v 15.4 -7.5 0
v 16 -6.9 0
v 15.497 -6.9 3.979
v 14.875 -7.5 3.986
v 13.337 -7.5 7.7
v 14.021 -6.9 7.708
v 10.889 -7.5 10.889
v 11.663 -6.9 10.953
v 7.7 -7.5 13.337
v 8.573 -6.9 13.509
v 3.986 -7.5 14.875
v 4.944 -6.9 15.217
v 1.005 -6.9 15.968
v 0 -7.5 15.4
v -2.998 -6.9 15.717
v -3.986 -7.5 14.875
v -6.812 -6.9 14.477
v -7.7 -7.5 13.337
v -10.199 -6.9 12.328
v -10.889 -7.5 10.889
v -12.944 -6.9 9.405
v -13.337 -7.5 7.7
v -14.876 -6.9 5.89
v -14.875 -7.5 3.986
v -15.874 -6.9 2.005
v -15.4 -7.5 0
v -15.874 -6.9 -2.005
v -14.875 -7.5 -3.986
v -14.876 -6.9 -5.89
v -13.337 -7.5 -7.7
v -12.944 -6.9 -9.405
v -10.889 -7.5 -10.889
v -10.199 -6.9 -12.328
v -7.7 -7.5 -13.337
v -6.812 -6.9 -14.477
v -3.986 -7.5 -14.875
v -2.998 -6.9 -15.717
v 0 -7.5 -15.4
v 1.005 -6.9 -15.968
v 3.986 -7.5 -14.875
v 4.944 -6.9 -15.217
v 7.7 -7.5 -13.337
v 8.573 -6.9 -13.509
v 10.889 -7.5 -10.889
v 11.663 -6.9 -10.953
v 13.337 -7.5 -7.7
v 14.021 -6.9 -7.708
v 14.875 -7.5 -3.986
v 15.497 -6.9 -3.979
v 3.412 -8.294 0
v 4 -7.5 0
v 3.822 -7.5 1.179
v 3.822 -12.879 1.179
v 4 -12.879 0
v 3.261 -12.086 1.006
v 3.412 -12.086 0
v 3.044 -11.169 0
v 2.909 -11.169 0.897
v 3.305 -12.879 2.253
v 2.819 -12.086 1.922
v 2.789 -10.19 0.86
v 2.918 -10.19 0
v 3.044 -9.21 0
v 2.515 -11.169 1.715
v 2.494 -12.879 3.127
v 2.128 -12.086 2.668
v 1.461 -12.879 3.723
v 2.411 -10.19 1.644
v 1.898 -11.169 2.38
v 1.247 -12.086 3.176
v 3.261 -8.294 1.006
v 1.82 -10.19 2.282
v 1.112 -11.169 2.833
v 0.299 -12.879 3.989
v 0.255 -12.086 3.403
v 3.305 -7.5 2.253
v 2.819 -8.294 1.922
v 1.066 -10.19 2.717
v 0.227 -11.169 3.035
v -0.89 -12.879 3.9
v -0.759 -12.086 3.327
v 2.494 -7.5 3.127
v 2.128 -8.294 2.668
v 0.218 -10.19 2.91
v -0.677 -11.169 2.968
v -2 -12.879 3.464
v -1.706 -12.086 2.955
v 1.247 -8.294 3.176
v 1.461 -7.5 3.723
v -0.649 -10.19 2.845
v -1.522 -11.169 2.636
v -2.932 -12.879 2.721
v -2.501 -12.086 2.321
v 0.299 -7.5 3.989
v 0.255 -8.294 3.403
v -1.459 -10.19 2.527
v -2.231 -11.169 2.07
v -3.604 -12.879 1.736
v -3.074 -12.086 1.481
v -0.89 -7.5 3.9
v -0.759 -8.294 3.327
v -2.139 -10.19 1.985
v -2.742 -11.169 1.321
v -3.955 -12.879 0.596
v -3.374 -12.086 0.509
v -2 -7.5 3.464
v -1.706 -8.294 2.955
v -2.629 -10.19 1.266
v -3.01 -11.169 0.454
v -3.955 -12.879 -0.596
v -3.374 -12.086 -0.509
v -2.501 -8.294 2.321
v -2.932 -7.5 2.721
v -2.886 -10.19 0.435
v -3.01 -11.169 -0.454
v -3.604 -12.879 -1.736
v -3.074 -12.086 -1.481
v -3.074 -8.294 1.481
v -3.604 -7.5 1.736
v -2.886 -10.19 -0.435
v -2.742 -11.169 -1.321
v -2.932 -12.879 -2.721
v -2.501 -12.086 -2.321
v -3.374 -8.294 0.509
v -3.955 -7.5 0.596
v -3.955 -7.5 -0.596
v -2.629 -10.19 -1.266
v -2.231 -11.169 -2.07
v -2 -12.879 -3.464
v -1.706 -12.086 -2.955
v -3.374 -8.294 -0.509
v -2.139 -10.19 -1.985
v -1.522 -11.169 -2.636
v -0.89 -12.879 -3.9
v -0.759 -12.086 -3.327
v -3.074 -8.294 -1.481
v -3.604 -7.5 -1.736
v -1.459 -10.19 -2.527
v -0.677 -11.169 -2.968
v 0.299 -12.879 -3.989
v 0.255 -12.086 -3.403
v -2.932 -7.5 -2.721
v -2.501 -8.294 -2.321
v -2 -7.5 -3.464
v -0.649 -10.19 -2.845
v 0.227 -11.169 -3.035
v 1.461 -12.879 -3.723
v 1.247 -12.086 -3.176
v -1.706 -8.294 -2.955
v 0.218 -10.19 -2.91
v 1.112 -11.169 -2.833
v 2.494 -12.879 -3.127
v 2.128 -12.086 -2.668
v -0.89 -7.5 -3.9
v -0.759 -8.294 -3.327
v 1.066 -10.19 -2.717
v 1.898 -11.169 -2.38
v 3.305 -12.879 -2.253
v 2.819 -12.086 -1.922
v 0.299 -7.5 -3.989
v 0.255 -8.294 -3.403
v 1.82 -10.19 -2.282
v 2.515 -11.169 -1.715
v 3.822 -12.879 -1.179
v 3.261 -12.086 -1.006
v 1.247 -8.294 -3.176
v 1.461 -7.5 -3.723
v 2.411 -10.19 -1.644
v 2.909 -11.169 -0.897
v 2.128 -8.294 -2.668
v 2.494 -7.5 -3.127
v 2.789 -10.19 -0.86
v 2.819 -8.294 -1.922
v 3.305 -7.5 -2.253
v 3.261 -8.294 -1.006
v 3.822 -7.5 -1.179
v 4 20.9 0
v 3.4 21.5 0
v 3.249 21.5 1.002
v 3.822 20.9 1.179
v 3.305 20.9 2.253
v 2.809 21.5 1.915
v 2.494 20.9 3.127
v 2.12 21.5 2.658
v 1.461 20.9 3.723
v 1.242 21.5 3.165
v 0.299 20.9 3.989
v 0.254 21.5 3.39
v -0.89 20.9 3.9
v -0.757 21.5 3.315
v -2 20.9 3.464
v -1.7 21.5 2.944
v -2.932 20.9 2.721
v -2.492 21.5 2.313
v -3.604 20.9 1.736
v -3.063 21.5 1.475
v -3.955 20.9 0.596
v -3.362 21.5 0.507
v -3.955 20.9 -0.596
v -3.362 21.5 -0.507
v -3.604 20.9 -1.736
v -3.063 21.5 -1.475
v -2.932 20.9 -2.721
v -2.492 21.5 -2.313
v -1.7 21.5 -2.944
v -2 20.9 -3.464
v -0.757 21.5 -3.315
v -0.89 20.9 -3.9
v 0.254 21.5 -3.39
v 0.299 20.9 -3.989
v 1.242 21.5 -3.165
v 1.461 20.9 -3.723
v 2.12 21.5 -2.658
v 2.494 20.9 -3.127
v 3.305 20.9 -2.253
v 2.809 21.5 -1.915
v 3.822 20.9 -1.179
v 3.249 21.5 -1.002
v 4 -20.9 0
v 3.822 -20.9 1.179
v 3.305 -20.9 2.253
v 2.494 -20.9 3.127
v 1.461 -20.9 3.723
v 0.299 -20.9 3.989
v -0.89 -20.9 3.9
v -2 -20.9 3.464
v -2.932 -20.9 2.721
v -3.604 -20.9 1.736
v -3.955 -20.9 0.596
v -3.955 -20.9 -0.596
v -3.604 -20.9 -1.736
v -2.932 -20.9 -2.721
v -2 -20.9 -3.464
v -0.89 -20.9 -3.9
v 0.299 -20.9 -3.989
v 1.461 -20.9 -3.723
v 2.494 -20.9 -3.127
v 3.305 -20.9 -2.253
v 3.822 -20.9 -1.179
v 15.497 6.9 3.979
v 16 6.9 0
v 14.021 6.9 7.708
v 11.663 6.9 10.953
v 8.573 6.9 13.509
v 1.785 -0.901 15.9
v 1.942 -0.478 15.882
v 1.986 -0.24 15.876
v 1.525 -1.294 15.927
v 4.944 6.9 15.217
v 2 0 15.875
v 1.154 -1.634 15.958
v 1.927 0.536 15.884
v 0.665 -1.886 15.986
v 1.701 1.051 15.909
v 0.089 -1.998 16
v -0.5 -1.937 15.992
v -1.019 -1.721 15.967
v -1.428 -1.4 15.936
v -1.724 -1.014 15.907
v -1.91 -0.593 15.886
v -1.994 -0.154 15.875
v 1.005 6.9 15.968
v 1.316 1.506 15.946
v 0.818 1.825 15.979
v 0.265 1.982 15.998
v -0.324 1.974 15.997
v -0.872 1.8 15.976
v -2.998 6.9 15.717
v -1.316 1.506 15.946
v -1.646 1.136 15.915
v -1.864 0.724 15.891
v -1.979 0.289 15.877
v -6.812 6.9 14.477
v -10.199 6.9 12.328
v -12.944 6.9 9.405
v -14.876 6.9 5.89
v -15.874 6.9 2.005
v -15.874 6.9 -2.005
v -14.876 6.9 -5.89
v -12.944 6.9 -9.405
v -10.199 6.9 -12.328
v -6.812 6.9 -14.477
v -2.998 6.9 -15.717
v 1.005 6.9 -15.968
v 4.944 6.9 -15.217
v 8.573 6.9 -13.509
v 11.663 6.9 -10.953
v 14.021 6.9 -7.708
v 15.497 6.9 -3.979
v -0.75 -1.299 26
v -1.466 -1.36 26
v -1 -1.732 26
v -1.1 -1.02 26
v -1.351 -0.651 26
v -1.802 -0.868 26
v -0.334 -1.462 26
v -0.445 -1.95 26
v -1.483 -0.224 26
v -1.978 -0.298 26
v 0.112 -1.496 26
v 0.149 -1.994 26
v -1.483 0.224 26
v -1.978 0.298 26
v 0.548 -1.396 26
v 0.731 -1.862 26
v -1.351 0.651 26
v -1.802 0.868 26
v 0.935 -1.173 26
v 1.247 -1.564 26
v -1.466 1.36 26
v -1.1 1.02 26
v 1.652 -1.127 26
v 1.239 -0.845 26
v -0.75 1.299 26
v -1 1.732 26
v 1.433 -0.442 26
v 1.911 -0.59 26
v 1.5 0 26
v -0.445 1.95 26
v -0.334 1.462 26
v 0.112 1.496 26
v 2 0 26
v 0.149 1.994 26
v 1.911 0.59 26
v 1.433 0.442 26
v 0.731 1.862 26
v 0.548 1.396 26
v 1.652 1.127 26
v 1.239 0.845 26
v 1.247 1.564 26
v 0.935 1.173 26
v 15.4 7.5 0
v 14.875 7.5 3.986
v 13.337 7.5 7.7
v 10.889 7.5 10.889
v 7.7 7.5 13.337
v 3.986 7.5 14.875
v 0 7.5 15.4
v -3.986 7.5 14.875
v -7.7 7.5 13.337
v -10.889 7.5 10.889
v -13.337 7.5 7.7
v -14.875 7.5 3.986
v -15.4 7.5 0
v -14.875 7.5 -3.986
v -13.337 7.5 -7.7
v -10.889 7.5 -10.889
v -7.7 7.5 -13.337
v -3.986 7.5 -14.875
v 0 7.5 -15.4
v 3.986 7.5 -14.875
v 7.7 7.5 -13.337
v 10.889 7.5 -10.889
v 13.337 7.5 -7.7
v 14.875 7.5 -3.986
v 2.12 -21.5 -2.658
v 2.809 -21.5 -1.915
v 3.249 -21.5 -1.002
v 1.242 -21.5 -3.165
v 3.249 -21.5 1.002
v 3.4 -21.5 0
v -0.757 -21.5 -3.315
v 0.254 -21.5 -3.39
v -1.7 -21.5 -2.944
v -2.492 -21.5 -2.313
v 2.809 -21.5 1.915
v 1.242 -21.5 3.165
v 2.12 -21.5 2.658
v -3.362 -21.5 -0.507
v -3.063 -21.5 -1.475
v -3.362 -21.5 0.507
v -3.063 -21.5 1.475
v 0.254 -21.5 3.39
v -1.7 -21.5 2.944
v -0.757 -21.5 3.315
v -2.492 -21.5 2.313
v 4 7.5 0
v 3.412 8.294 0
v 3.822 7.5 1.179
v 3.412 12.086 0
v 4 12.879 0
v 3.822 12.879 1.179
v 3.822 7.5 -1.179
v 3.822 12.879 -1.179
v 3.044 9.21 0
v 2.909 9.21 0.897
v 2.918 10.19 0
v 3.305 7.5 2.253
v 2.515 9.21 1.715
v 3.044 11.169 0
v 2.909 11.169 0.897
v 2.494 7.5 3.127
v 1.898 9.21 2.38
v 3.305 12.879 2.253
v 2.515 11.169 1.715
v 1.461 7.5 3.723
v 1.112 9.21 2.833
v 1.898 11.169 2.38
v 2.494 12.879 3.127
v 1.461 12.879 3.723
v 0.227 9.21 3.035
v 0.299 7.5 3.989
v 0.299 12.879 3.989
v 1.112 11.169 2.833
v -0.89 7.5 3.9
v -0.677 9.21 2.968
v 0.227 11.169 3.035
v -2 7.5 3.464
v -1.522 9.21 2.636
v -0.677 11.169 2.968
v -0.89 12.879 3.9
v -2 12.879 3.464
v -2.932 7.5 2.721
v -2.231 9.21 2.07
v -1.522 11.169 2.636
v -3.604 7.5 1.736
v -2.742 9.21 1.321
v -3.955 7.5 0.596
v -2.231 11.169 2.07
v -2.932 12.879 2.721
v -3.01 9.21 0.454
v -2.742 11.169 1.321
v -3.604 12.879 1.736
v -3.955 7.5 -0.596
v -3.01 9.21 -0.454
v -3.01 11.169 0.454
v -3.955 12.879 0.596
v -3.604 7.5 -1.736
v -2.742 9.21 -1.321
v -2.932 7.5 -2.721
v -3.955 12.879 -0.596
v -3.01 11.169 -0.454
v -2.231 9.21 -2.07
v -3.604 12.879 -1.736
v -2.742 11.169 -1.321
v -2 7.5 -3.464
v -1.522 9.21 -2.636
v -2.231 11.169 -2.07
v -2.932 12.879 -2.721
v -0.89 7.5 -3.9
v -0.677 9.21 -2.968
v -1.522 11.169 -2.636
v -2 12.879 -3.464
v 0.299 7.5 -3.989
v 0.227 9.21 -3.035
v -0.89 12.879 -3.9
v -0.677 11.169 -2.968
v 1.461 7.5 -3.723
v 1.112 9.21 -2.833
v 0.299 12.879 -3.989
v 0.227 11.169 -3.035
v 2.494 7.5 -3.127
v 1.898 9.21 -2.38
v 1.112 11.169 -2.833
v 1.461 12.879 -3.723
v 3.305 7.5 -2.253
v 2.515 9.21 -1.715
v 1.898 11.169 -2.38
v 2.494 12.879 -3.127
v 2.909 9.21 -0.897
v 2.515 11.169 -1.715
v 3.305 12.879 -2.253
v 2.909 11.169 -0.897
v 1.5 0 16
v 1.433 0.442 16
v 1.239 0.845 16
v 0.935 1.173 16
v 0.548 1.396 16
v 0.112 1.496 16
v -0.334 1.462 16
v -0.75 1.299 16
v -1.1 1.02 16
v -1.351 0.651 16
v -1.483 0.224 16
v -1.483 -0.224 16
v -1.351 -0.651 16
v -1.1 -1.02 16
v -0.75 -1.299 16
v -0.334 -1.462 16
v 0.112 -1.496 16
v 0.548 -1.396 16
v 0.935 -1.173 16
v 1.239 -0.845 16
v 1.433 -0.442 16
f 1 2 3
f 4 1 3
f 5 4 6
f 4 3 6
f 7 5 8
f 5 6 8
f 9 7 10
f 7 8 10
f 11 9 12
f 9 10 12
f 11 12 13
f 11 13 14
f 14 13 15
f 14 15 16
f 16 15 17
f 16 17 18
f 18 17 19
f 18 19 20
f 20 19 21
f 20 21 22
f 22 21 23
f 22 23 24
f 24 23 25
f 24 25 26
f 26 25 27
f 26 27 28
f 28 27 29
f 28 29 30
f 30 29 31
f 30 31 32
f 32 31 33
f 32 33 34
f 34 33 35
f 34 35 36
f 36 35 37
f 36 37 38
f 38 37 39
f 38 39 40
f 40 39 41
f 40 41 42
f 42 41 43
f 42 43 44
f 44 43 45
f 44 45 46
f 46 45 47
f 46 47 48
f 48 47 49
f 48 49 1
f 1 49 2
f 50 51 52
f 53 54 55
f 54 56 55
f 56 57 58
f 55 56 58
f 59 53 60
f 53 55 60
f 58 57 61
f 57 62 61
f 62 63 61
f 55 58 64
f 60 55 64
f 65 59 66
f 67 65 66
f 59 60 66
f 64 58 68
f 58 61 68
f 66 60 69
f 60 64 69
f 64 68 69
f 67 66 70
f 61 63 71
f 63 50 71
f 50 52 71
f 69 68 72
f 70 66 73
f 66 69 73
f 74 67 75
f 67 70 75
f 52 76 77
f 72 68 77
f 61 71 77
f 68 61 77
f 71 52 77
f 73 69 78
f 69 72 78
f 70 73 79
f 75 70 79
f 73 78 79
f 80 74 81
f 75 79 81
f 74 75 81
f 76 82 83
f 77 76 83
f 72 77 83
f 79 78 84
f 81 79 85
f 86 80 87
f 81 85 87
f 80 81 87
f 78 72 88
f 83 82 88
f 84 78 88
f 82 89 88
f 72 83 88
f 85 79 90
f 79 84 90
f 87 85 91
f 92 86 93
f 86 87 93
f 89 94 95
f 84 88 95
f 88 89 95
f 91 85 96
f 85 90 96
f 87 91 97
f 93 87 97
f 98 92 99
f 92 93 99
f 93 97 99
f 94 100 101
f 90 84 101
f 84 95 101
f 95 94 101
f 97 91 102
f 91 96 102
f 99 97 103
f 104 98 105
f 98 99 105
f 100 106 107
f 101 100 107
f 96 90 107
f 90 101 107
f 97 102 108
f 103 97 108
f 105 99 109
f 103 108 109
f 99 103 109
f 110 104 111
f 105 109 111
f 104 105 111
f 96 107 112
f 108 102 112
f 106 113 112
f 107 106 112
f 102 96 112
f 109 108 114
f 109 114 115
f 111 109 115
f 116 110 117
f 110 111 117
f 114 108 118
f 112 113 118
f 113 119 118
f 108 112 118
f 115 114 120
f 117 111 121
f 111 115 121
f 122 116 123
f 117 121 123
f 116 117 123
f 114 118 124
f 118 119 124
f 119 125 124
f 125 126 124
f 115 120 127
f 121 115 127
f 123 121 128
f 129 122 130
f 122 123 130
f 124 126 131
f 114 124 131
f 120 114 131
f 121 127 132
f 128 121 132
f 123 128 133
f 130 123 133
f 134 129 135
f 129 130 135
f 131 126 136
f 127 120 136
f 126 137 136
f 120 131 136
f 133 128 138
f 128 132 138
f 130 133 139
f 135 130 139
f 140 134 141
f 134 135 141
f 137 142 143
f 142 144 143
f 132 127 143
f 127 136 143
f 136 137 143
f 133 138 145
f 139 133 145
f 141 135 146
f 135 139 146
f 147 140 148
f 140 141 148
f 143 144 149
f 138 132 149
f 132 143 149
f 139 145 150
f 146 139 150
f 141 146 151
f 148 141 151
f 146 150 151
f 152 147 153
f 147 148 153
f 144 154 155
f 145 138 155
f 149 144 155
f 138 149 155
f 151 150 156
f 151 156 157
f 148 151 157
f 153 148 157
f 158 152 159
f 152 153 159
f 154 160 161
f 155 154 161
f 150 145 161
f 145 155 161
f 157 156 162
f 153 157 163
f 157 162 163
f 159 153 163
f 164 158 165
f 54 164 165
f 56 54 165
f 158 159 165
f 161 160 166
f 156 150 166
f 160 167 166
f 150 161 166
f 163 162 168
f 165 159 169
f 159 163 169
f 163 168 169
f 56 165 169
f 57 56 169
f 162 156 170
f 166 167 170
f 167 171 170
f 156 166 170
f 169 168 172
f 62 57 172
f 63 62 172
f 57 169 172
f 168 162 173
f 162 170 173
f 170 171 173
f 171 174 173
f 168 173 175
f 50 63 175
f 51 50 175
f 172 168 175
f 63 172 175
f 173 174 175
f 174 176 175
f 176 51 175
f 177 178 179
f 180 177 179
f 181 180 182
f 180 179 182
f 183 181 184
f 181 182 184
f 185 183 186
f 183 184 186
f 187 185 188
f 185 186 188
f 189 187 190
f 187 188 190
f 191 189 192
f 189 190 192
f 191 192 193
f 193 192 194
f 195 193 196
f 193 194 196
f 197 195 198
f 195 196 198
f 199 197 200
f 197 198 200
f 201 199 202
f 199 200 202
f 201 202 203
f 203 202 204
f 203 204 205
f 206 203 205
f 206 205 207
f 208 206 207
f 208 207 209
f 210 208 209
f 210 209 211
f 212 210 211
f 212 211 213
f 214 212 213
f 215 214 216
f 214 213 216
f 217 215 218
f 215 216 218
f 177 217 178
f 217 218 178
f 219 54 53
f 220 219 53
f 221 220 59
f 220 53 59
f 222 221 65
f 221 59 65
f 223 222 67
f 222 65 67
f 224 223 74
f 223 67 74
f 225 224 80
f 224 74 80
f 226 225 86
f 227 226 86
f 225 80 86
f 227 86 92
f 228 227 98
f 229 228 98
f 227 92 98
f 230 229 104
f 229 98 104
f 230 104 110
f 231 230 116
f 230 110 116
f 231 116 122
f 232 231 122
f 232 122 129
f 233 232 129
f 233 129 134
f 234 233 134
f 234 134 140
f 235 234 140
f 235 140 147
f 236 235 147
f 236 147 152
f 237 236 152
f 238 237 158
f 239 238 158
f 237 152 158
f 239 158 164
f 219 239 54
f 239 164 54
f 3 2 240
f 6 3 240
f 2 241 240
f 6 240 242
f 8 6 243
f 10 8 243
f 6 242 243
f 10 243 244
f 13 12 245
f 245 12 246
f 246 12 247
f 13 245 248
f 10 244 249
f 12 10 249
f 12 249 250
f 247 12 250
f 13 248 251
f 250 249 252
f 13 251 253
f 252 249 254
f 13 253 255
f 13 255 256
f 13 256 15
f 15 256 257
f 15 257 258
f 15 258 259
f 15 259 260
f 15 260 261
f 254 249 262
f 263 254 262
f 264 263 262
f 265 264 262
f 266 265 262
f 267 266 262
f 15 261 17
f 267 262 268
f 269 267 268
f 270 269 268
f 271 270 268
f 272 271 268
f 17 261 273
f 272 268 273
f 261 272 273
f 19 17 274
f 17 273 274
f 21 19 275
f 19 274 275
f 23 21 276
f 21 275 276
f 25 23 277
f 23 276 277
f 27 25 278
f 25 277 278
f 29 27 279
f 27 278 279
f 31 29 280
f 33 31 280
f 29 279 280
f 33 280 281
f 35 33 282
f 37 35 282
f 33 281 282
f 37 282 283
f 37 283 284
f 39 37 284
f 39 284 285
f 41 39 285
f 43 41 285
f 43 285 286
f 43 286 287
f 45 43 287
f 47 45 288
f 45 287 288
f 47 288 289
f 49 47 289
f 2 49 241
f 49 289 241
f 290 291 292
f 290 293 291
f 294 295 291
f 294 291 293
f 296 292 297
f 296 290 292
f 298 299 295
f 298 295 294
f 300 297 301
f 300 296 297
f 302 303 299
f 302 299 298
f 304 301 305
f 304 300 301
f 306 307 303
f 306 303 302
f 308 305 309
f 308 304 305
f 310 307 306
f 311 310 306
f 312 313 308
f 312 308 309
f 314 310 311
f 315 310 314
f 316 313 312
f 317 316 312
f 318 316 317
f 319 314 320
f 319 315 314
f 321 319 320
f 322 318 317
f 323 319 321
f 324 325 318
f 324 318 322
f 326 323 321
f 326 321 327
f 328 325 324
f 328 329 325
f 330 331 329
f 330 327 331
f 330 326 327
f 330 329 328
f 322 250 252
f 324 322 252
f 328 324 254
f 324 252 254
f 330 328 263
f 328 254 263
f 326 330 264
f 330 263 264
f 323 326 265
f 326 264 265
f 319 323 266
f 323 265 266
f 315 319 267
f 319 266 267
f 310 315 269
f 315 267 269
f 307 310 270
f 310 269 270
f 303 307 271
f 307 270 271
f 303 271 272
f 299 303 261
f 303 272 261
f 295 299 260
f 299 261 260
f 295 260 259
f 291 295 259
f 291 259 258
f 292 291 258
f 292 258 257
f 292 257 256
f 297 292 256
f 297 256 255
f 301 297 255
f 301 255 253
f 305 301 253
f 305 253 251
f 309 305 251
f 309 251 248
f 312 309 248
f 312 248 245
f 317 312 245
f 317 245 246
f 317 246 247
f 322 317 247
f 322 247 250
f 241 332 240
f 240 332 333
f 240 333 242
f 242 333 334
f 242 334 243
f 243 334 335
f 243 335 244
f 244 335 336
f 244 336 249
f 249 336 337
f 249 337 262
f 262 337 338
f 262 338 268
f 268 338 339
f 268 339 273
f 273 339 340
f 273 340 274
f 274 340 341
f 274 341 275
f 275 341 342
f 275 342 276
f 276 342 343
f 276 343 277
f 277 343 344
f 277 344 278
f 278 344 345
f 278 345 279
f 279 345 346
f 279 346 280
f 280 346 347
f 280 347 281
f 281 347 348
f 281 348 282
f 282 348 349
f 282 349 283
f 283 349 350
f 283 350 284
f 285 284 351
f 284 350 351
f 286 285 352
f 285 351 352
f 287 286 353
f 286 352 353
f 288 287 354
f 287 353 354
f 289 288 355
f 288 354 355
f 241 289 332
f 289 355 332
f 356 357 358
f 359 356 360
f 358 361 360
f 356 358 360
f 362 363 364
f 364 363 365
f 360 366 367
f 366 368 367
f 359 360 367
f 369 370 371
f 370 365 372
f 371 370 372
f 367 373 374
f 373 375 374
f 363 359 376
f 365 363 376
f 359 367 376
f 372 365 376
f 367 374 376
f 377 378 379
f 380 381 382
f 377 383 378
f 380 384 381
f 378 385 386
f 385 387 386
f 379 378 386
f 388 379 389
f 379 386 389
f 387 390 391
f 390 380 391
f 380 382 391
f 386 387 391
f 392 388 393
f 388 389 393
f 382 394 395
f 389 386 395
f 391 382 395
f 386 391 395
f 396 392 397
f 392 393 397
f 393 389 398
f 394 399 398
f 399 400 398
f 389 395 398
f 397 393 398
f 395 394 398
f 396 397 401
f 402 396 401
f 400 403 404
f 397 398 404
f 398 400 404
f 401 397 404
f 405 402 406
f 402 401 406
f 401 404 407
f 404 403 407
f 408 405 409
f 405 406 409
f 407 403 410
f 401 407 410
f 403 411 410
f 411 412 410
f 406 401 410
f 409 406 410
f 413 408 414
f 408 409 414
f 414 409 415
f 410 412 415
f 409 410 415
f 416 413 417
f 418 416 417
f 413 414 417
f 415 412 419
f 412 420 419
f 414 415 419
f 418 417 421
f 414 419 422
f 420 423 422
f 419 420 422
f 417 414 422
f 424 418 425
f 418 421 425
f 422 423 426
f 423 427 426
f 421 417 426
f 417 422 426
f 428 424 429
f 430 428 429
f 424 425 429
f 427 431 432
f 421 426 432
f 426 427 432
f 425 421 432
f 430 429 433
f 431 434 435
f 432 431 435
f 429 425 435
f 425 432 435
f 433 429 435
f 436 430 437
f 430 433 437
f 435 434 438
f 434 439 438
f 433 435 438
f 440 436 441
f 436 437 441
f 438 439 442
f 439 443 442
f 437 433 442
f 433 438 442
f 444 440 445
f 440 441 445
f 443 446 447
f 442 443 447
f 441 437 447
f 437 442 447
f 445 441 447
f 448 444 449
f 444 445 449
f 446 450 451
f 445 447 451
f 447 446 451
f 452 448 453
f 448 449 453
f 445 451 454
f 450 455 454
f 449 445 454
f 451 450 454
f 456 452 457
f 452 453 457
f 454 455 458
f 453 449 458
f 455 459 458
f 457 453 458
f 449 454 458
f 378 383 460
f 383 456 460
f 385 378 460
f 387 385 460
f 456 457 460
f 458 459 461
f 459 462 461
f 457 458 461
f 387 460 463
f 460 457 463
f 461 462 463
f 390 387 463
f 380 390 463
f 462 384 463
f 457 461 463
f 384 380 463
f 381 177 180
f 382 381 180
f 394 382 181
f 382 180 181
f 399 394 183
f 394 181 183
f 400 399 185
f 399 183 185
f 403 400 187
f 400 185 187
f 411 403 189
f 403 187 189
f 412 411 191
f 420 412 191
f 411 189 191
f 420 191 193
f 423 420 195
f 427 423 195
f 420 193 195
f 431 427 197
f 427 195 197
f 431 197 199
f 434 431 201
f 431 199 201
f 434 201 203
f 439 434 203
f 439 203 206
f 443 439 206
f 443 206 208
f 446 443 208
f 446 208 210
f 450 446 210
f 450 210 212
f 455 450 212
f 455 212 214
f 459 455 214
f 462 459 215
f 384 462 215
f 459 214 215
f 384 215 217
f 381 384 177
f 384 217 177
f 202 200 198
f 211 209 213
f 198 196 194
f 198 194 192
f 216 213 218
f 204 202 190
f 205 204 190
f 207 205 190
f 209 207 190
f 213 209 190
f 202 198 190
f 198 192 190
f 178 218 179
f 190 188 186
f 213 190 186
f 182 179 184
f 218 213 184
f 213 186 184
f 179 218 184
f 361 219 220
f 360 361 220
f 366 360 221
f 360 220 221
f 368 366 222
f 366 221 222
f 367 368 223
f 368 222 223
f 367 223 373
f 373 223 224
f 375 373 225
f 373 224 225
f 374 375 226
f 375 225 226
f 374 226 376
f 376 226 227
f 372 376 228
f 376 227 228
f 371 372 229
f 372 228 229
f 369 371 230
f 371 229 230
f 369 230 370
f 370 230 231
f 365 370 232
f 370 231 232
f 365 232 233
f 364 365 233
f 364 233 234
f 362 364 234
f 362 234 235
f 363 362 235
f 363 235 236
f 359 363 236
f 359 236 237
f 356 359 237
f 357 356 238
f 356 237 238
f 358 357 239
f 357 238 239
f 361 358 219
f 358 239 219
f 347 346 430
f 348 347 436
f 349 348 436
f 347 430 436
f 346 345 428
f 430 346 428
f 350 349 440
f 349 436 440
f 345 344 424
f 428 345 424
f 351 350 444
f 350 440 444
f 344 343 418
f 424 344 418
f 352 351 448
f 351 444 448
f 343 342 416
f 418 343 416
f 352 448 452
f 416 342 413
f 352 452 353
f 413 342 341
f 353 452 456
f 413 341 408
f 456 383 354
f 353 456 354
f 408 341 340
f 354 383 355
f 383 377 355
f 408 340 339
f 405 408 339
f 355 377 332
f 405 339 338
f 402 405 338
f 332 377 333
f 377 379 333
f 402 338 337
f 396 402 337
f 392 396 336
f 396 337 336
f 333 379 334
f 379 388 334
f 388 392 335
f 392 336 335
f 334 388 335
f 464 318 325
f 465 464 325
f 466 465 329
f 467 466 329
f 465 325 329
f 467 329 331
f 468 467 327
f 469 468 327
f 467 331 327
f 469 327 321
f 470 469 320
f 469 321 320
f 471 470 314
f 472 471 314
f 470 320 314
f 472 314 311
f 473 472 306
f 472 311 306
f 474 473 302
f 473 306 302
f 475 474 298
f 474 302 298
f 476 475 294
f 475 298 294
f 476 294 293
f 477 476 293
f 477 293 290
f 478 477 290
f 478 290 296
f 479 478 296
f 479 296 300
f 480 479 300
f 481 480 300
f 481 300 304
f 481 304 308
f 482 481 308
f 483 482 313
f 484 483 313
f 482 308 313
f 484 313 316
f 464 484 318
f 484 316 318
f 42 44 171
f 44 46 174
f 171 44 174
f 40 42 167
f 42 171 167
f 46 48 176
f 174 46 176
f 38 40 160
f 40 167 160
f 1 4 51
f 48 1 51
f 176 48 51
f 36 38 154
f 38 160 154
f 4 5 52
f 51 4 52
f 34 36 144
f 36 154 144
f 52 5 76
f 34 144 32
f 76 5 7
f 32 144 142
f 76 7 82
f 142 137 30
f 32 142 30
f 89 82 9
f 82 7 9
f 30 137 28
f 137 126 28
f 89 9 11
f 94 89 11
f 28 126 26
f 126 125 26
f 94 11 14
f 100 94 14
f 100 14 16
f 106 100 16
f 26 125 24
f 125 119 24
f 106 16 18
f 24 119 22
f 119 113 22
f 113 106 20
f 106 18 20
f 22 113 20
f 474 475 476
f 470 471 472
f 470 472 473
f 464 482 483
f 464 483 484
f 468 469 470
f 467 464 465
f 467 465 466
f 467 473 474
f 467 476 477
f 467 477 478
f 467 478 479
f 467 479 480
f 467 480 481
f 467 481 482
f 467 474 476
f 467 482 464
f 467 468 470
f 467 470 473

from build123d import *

# Parameters (mm, degrees)
F2_SIZE  = 0.6
F3_R     = 2
F4_DEPTH = 26
F5_R     = 1.5
F6_DEPTH = 10


with BuildPart() as f1:
    # F0 (on Top) → F1 (revolve)
    with BuildSketch(Plane.XY):
        with BuildLine():
            Line((0, 21.5), (0, 0))
            Line((0, 0), (16, 0))
            Line((16, 0), (16, 7.5))
            Line((16, 7.5), (4, 7.5))
            ThreePointArc((4, 7.5), (2.918364, 10.189654), (4, 12.879307))
            Line((4, 12.879307), (4, 21.5))
            Line((4, 21.5), (0, 21.5))
        make_face()
        with BuildLine():
            Line((16, 0), (0, 0))
            Line((0, 0), (0, -21.5))
            Line((0, -21.5), (4, -21.5))
            Line((4, -21.5), (4, -12.879307))
            ThreePointArc((4, -12.879307), (2.918364, -10.189654), (4, -7.5))
            Line((4, -7.5), (16, -7.5))
            Line((16, -7.5), (16, 0))
        make_face()
    revolve(axis=Axis((0, 10.75, 0), (0, -1, 0)))

    # F2
    f2_edges = [f1.edges().sort_by_distance(p)[0] for p in [
        (-4, 21.5, 0),
        (-16, 7.5, 0),
        (-16, -7.5, 0),
        (-4, -21.5, 0),
    ]]
    chamfer(f2_edges, length=F2_SIZE)

    # F3 (on Top) → F4 (join)
    with BuildSketch(Plane.XY):
        Circle(F3_R)
    extrude(amount=F4_DEPTH)

    # F5 (on face) → F6 (cut)
    with BuildSketch(Plane.XY.offset(26)):
        Circle(F5_R)
    extrude(amount=-F6_DEPTH, mode=Mode.SUBTRACT)


solid = f1.part
